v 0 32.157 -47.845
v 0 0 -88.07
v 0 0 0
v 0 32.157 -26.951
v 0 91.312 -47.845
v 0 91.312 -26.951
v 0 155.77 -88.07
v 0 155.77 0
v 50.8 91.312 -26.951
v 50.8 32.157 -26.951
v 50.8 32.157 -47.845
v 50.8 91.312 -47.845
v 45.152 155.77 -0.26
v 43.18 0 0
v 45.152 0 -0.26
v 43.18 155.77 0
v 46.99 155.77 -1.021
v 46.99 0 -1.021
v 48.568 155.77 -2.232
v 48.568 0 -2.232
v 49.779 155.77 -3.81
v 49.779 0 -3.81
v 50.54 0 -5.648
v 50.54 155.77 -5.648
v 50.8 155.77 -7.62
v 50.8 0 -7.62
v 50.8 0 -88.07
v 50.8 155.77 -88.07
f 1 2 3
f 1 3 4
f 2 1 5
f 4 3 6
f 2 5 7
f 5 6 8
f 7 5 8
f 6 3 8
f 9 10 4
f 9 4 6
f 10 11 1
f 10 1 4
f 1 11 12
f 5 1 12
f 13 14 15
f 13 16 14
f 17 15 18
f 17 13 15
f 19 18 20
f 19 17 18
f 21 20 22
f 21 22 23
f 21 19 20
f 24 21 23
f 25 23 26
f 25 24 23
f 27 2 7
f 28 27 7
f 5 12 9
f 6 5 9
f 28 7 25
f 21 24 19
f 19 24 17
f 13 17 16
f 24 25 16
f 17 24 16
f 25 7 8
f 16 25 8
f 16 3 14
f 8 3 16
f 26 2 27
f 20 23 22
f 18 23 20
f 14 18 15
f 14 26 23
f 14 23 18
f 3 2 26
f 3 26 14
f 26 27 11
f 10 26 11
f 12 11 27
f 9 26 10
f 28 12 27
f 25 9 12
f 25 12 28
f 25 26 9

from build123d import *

# Parameters (mm, degrees)
F0_W     = 155.76981
F0_H     = 88.070355
F1_DEPTH = 50.8
F2_R     = 7.62
F3_W     = 59.155117
F3_H     = 20.894366
F4_DEPTH = 50.8


with BuildPart() as f1:
    # F0 (on Right) → F1 (new body)
    with BuildSketch(Plane.YZ):
        with Locations((77.884905, -44.035177)):
            Rectangle(F0_W, F0_H)
    extrude(amount=F1_DEPTH)

    # F2
    f2_edges = [f1.edges().sort_by_distance(p)[0] for p in [
        (50.8, 77.884905, 0),
    ]]
    fillet(f2_edges, radius=F2_R)

    # F3 (on face) → F4 (cut)
    with BuildSketch(Plane.YZ.offset(50.8)):
        with Locations((61.734566, -37.397995)):
            Rectangle(F3_W, F3_H)
    extrude(amount=-F4_DEPTH, mode=Mode.SUBTRACT)


solid = f1.part
